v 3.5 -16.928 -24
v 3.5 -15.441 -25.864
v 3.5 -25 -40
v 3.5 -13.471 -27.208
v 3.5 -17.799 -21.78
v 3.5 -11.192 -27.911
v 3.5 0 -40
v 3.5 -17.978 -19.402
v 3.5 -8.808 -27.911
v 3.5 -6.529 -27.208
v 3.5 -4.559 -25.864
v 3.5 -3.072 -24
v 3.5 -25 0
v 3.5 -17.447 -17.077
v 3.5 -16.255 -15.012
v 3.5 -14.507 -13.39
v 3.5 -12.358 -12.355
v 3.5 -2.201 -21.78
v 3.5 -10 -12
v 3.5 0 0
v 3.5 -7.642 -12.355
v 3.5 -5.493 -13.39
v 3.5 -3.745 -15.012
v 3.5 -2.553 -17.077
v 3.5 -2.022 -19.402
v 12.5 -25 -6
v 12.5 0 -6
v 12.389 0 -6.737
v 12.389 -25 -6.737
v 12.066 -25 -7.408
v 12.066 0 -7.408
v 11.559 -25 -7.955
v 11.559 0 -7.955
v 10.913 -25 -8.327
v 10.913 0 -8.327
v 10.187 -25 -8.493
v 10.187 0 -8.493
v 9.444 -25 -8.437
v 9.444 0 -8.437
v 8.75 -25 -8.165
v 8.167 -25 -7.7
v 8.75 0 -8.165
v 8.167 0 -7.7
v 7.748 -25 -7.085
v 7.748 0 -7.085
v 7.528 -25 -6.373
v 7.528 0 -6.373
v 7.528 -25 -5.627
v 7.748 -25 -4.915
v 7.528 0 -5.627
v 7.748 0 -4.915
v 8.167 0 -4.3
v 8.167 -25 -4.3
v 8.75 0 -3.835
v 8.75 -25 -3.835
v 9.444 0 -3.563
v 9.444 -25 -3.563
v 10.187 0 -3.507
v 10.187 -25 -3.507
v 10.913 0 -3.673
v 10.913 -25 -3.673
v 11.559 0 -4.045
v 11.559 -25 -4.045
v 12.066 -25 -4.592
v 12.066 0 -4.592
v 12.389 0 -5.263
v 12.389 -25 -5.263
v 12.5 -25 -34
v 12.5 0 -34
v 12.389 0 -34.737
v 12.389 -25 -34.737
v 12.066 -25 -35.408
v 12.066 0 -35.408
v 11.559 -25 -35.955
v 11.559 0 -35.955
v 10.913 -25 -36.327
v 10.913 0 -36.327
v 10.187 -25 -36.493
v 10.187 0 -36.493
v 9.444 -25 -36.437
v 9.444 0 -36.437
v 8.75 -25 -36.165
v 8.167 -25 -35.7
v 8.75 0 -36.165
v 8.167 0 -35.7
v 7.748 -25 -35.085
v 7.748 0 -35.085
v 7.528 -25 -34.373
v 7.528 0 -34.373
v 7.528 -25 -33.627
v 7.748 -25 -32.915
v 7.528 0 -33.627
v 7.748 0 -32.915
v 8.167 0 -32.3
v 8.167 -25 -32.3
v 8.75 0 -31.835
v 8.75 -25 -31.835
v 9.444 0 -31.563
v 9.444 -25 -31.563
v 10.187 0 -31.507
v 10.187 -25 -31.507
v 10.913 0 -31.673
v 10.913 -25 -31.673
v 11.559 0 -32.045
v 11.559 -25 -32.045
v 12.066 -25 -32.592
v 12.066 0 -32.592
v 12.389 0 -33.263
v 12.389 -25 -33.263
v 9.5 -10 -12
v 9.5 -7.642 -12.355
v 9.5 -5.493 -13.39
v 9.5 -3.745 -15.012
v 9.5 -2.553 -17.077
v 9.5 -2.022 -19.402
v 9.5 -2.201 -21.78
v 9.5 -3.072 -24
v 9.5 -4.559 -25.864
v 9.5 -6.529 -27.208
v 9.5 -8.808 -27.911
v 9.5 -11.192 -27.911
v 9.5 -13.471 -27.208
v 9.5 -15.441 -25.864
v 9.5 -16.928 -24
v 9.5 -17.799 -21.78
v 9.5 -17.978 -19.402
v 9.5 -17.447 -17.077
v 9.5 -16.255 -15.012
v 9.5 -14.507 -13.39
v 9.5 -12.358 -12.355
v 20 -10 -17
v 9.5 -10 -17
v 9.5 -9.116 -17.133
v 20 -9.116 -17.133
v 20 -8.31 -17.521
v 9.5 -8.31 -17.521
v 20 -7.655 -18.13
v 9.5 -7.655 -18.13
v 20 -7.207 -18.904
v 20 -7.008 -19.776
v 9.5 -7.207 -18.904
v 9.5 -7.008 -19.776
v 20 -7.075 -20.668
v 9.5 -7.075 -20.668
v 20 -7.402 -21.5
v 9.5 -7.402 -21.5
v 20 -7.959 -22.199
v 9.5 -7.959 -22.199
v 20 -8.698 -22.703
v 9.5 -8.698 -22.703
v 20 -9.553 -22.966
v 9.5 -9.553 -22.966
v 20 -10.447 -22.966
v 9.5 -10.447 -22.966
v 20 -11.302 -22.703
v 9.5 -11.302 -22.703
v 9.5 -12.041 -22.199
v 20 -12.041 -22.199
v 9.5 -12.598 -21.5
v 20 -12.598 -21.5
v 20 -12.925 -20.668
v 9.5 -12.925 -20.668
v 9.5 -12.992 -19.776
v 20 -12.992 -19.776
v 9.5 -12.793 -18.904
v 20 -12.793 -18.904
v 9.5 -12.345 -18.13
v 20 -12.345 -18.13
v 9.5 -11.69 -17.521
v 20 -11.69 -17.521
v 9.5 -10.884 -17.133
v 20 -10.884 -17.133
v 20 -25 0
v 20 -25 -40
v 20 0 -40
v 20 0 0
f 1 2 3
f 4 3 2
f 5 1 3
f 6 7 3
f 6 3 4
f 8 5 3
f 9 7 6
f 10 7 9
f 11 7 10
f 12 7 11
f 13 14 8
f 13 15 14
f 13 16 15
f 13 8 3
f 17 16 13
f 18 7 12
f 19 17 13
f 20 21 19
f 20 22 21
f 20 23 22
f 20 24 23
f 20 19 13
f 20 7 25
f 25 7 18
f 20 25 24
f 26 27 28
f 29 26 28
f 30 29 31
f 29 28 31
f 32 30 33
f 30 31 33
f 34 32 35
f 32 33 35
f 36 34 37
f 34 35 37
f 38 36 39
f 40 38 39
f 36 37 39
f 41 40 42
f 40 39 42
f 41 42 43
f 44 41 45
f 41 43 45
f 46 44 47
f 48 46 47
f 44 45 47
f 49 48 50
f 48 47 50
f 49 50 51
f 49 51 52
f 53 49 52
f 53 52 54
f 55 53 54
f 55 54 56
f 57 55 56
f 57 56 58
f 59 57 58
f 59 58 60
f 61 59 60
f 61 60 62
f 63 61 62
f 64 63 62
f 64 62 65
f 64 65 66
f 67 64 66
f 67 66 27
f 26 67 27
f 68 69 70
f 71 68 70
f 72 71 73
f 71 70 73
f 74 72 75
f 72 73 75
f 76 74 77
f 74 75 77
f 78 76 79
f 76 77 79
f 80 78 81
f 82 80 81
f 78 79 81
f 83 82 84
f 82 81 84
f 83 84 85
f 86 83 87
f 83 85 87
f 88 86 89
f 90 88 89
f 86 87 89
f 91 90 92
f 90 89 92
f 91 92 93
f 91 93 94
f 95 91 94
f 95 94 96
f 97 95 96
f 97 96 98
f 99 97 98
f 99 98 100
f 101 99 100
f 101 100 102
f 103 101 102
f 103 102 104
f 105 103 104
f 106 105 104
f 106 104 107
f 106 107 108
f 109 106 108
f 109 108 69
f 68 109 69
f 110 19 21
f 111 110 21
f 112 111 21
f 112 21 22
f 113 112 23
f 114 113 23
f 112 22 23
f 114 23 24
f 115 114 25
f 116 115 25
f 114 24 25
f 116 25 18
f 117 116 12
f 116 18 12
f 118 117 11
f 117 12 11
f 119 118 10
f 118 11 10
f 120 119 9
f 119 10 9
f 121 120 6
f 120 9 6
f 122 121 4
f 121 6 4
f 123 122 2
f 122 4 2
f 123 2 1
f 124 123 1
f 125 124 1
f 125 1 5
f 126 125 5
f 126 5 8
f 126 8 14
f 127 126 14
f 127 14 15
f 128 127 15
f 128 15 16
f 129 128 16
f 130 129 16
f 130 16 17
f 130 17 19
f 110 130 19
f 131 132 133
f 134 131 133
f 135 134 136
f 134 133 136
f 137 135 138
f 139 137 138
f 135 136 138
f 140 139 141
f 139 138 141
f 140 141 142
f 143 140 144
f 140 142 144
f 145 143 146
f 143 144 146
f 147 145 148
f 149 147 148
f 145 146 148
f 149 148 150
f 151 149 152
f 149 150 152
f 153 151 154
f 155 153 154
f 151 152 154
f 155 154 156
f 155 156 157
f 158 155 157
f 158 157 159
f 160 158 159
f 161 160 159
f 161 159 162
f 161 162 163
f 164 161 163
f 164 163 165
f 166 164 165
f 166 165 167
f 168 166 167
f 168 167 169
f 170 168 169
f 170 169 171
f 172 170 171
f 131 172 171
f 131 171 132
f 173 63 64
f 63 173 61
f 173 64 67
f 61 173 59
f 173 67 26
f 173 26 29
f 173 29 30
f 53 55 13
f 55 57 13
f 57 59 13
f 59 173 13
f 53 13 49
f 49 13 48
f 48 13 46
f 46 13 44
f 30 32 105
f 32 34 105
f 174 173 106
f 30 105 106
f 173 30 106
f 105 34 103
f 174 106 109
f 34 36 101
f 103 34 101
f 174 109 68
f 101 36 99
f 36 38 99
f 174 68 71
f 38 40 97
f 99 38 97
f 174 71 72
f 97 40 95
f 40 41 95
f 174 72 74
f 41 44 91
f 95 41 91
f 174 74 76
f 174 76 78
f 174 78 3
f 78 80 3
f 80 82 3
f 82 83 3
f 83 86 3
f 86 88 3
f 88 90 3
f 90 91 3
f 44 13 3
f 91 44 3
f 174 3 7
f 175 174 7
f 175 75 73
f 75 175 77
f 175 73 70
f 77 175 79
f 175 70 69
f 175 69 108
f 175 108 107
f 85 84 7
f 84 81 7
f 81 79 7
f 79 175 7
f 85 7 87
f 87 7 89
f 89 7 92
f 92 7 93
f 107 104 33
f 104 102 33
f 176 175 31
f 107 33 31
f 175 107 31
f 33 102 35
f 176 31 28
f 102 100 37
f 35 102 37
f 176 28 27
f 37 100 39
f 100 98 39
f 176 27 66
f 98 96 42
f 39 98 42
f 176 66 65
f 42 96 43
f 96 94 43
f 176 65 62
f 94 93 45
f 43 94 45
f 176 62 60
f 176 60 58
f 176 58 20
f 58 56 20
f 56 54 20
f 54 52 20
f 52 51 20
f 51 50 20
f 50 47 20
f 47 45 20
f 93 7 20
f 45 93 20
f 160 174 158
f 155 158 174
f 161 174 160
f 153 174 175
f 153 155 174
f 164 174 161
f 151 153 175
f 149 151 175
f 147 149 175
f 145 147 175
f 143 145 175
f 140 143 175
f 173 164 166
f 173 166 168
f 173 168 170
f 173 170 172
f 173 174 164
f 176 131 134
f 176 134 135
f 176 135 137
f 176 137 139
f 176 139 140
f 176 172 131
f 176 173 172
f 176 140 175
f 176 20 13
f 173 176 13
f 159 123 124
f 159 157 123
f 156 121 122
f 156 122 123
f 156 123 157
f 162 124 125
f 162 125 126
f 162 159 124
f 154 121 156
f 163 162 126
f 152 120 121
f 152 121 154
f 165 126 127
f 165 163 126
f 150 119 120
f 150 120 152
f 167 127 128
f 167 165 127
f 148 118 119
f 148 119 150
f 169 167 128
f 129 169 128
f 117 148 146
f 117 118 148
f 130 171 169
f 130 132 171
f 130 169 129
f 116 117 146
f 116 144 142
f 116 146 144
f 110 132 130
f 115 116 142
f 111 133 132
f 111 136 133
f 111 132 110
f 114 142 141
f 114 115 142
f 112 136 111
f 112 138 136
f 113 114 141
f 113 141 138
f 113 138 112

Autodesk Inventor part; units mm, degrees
ref_plane "YZ Plane" through (0, 0, 0) normal (1, 0, 0) x (0, 1, 0)
ref_plane "XZ Plane" through (0, 0, 0) normal (0, 1, 0) x (-1, 0, 0)
ref_plane "XY Plane" through (0, 0, 0) normal (0, 0, 1) x (1, 0, 0)
sketch "Sketch1" plane through (0, 0, 0) normal (1, 0, 0) x (0, 1, 0)
  line L0 (0, 0) -> (-25, 0)
  line L1 (-25, 0) -> (-25, -40)
  line L2 (-25, -40) -> (0, -40)
  line L3 (0, -40) -> (0, 0)
  dimension "d0" = 25
  dimension "d1" = 40
extrude "Extrusion1" add sketch "Sketch1" along normal blind 20
sketch "Sketch2" plane through (20, 0, 0) normal (1, 0, 0) x (0, 0, -1)
  line L0 (0, 0) -> (20, 0)
  line L1 (40, 0) -> (0, 0) projected
  line L2 (20, 0) -> (20, -10)
  circle A0 centre (20, -10) radius 2.5
  dimension "d4" = 20
  dimension "d5" = 10
  dimension "d6" = 5
extrude "Extrusion2" cut sketch "Sketch2" against normal blind 20
sketch "Sketch3" plane through (0, 0, 0) normal (0, 1, 0) x (1, 0, 0)
  line L0 (0, 0) -> (20, 0) projected
  line L1 (0, 0) -> (10, 0)
  line L2 (10, 0) -> (10, 6)
  line L3 (0, 40) -> (10, 40)
  line L4 (0, 40) -> (20, 40) projected
  line L5 (10, 40) -> (10, 34)
  circle A0 centre (10, 6) radius 2.5
  circle A1 centre (10, 34) radius 2.5
  dimension "d9" = 10
  dimension "d10" = 6
  dimension "d11" = 6
  dimension "d12" = 5
  dimension "d13" = 5
extrude "Extrusion3" cut sketch "Sketch3" against normal through all
sketch "Sketch4" plane through (0, 0, 0) normal (-1, 0, 0) x (0, 0, 1)
  circle A0 centre (-20, -10) radius 2.5 projected
  circle A1 centre (-20, -10) radius 8
  point P0 (0, 0)
  dimension "d16" = 16
extrude "Extrusion4" cut sketch "Sketch4" against normal blind 9.5
sketch "Sketch5" plane through (9.5, -10, -20) normal (-1, 0, 0) x (0, 0, 1)
  circle A0 centre (0, 0) radius 3
  point P0 (20, 10)
  dimension "d19" = 6
extrude "Extrusion5" cut sketch "Sketch5" against normal through all
sketch "Sketch6" plane through (0, 0, 0) normal (-1, 0, 0) x (0, 0, 1)
  line L0 (-57.9528, 15.7727) -> (32.6208, 15.7727)
  line L1 (32.6208, 15.7727) -> (32.6208, -49.7079)
  line L2 (32.6208, -49.7079) -> (-57.9528, -49.7079)
  line L3 (-57.9528, -49.7079) -> (-57.9528, 15.7727)
  point P0 (0, 0)
extrude "Extrusion6" cut sketch "Sketch6" against normal blind 3.5
properties part number "linac_mover_upper_ax_holder"
